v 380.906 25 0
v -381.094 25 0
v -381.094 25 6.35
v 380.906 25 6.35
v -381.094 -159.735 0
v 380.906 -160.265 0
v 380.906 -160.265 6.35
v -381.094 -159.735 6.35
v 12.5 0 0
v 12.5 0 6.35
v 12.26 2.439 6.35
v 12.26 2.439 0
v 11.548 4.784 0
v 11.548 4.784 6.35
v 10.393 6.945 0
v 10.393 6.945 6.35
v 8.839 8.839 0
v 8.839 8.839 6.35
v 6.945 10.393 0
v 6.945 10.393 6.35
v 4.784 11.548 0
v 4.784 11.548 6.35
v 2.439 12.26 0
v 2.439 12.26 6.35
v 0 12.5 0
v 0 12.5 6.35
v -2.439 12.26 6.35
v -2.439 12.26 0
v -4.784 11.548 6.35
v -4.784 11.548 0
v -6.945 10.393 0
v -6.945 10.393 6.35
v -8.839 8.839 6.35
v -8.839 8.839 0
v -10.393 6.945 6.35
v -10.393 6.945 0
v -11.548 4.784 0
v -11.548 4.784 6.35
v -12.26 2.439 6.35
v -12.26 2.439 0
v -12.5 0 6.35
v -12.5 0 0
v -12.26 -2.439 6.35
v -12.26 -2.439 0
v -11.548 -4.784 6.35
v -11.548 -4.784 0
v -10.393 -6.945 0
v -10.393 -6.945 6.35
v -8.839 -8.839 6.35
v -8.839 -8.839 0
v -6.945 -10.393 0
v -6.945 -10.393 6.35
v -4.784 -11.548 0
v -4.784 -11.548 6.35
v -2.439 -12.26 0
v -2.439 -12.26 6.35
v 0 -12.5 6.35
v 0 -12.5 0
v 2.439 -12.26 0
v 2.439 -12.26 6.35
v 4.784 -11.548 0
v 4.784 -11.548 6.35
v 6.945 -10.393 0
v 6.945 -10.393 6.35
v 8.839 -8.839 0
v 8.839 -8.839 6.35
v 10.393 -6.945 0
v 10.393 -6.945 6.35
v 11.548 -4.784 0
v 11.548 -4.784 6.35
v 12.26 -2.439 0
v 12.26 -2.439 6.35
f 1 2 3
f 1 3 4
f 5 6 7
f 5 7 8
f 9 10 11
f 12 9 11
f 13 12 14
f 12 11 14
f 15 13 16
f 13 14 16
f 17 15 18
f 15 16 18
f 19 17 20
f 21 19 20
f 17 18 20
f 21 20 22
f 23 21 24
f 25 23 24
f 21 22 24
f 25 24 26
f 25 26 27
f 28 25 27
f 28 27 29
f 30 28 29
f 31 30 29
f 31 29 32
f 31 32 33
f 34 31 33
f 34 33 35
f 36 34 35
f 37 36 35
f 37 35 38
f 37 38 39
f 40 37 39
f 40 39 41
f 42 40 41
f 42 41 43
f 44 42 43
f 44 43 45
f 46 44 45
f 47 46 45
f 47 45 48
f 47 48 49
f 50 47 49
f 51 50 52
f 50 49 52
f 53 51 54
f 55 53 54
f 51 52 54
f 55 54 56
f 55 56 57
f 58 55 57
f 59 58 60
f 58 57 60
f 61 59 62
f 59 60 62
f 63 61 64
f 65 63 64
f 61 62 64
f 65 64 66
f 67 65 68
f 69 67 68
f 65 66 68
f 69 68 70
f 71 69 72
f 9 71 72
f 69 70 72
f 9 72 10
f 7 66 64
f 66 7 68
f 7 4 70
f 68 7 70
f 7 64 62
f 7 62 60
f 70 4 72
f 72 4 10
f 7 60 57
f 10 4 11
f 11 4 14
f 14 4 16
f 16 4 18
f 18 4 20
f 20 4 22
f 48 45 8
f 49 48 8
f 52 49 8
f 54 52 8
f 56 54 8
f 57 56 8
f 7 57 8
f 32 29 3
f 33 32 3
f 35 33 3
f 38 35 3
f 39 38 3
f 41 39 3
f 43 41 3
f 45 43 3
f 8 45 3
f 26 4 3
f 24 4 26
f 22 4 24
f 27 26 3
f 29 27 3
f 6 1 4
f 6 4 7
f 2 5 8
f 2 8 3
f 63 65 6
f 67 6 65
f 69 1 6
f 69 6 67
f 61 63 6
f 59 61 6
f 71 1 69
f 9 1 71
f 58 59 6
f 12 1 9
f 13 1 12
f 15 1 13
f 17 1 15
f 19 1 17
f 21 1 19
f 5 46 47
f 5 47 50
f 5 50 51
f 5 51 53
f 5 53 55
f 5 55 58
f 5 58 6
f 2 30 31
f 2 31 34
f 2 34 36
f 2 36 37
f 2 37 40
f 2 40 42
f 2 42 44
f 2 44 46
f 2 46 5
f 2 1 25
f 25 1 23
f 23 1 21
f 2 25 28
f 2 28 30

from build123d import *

# Parameters (mm, degrees)
BOSS_EXTRUDE1_DEPTH = 6.35
SKETCH2_R           = 12.5
CUT_EXTRUDE1_DEPTH  = 414.4708728


with BuildPart() as part:
    # Sketch1 → Boss-Extrude1 (new body)
    with BuildSketch(Plane.XY):
        Polygon((-381.094249826, -159.734501203), (-381.094249826, 25), (380.905750174, 25), (380.905750174, -160.265445134), align=None)
    extrude(amount=BOSS_EXTRUDE1_DEPTH)

    # Sketch2 → Cut-Extrude1 (cut, through all)
    with BuildSketch(Plane.XY.offset(6.35)):
        Circle(SKETCH2_R)
    extrude(amount=-CUT_EXTRUDE1_DEPTH, mode=Mode.SUBTRACT)


solid = part.part
